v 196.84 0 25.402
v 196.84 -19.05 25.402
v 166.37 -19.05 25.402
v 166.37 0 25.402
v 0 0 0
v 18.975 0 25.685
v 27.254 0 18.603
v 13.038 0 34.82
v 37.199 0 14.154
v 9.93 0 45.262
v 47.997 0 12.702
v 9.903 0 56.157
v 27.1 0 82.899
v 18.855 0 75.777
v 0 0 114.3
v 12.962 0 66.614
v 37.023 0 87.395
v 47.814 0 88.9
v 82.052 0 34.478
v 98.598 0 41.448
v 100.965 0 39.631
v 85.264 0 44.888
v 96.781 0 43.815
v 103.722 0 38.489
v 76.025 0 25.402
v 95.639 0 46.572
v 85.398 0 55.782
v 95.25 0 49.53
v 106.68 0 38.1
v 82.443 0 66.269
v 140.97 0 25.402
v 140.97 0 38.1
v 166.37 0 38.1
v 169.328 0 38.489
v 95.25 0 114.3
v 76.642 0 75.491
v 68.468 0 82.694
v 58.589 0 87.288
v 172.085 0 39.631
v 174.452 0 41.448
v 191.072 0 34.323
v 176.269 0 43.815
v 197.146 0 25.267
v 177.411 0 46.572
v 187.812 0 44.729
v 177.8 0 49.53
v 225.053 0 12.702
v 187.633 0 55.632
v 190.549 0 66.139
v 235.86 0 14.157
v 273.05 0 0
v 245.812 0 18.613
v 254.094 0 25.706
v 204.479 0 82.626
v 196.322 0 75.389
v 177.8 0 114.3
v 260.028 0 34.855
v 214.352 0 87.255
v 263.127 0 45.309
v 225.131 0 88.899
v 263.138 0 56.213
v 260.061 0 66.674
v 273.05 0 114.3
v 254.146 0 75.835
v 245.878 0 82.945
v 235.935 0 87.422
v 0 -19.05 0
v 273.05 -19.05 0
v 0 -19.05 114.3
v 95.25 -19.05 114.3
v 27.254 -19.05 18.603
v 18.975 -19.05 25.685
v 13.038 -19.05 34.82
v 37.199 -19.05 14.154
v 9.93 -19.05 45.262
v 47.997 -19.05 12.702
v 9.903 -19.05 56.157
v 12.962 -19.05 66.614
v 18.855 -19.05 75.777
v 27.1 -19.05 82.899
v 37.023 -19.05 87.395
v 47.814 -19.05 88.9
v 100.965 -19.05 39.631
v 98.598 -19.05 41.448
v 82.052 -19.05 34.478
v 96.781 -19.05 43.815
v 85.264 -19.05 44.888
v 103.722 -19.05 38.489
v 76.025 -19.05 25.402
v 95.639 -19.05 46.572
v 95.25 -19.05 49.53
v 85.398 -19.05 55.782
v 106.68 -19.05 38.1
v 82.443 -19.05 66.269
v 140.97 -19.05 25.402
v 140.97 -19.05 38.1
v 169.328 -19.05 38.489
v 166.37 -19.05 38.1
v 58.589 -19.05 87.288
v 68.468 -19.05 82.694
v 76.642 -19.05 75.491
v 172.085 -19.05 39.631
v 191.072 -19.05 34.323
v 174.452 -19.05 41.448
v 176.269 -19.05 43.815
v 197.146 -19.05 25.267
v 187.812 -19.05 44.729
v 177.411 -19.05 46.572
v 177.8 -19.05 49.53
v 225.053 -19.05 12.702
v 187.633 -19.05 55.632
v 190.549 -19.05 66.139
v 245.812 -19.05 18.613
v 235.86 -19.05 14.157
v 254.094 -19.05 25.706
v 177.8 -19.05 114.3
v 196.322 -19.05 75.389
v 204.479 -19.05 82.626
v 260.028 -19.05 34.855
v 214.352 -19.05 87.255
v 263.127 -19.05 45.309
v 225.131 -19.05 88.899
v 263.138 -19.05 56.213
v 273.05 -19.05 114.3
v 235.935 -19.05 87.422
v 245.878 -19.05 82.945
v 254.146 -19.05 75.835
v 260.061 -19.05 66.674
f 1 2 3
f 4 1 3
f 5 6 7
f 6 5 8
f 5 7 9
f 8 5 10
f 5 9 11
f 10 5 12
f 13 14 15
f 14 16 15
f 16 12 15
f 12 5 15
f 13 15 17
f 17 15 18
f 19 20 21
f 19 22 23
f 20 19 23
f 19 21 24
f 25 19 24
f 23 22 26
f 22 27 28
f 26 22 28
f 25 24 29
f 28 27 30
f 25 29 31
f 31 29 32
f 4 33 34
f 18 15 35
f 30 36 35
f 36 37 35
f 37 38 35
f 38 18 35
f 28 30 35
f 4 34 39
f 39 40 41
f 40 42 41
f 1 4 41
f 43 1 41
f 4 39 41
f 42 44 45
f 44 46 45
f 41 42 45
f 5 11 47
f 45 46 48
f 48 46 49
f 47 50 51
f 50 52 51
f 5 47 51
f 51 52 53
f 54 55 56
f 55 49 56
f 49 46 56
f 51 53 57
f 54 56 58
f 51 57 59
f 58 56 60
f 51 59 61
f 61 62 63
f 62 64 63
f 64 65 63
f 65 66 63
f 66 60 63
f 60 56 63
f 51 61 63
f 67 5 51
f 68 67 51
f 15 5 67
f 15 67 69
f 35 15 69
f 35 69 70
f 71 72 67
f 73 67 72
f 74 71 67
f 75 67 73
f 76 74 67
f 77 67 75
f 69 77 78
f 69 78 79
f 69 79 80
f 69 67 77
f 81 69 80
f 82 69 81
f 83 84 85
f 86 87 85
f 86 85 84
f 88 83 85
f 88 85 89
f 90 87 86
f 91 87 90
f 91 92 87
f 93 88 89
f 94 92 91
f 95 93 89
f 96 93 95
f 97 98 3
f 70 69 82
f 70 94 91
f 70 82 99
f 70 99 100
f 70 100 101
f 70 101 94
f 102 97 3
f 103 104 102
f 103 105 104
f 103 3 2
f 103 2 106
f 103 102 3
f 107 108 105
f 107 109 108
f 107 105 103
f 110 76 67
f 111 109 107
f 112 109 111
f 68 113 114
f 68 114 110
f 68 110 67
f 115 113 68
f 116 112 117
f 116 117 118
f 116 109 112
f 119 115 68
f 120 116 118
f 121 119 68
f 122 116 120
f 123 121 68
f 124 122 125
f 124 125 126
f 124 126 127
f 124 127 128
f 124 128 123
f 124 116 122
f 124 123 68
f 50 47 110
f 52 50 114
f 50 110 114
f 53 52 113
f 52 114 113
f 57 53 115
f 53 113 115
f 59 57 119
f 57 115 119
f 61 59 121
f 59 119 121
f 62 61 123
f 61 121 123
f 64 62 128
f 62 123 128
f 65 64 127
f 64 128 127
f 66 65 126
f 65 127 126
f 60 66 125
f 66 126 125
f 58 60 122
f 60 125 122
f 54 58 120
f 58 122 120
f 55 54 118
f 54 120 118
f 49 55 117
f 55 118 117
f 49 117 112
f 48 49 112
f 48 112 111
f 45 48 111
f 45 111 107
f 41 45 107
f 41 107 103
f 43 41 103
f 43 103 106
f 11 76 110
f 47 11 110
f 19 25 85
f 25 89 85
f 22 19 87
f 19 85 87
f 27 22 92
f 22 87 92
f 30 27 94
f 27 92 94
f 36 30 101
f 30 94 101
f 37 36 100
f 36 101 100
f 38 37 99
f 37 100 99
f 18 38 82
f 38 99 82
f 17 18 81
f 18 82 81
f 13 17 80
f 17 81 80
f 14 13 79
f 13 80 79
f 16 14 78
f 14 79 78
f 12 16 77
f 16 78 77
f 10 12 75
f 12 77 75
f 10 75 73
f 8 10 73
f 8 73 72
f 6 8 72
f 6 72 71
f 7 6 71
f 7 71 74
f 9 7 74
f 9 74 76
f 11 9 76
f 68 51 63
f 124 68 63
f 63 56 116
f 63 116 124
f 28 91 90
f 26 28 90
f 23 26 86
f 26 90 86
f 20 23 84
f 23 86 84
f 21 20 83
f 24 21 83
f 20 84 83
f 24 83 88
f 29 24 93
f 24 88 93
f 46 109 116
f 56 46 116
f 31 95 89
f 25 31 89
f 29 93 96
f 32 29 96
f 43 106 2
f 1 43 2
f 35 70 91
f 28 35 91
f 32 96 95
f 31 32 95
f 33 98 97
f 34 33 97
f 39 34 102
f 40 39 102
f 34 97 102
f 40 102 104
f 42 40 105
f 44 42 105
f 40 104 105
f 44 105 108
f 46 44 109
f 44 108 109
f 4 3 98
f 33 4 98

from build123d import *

# Parameters (mm, degrees)
F0_W     = 273.05
F0_H     = 114.3
F1_DEPTH = 19.05
F2_R     = 38.1
F3_DEPTH = 25.4
F5_DEPTH = 45.72
F7_DEPTH = 25.4


with BuildPart() as f1:
    # F0 (on Front) → F1 (new body)
    with BuildSketch(Plane.XZ):
        with Locations((136.525, 57.15)):
            Rectangle(F0_W, F0_H)
    extrude(amount=F1_DEPTH)

    # F2 (on face) → F3 (cut)
    with BuildSketch(Plane.XZ.offset(19.05)):
        with Locations((47.625, 50.8)):
            Circle(F2_R)
        with Locations((225.425, 50.8)):
            Circle(F2_R)
    extrude(amount=-F3_DEPTH, mode=Mode.SUBTRACT)

    # F4 (on face) → F5 (cut)
    with BuildSketch(Plane.XZ.offset(19.05)):
        with BuildLine():
            Line((177.8, 114.3), (95.25, 114.3))
            Line((95.25, 114.3), (95.25, 49.53))
            ThreePointArc((95.25, 49.53), (98.597769, 41.447769), (106.68, 38.1))
            Line((106.68, 38.1), (166.37, 38.1))
            ThreePointArc((166.37, 38.1), (174.452231, 41.447769), (177.8, 49.53))
            Line((177.8, 49.53), (177.8, 114.3))
        make_face()
    extrude(amount=-F5_DEPTH, mode=Mode.SUBTRACT)

    # F6 (on face) → F7 (cut)
    with BuildSketch(Plane.XZ.offset(19.05)):
        Polygon((166.37, 25.401815), (166.37, 38.1), (140.97, 38.1), (140.97, 25.401815), (59.75961, 25.401815), (47.996878, 12.701815), (225.796878, 12.701815), (196.839669, 25.401815), align=None)
    extrude(amount=-F7_DEPTH, mode=Mode.SUBTRACT)


solid = f1.part
